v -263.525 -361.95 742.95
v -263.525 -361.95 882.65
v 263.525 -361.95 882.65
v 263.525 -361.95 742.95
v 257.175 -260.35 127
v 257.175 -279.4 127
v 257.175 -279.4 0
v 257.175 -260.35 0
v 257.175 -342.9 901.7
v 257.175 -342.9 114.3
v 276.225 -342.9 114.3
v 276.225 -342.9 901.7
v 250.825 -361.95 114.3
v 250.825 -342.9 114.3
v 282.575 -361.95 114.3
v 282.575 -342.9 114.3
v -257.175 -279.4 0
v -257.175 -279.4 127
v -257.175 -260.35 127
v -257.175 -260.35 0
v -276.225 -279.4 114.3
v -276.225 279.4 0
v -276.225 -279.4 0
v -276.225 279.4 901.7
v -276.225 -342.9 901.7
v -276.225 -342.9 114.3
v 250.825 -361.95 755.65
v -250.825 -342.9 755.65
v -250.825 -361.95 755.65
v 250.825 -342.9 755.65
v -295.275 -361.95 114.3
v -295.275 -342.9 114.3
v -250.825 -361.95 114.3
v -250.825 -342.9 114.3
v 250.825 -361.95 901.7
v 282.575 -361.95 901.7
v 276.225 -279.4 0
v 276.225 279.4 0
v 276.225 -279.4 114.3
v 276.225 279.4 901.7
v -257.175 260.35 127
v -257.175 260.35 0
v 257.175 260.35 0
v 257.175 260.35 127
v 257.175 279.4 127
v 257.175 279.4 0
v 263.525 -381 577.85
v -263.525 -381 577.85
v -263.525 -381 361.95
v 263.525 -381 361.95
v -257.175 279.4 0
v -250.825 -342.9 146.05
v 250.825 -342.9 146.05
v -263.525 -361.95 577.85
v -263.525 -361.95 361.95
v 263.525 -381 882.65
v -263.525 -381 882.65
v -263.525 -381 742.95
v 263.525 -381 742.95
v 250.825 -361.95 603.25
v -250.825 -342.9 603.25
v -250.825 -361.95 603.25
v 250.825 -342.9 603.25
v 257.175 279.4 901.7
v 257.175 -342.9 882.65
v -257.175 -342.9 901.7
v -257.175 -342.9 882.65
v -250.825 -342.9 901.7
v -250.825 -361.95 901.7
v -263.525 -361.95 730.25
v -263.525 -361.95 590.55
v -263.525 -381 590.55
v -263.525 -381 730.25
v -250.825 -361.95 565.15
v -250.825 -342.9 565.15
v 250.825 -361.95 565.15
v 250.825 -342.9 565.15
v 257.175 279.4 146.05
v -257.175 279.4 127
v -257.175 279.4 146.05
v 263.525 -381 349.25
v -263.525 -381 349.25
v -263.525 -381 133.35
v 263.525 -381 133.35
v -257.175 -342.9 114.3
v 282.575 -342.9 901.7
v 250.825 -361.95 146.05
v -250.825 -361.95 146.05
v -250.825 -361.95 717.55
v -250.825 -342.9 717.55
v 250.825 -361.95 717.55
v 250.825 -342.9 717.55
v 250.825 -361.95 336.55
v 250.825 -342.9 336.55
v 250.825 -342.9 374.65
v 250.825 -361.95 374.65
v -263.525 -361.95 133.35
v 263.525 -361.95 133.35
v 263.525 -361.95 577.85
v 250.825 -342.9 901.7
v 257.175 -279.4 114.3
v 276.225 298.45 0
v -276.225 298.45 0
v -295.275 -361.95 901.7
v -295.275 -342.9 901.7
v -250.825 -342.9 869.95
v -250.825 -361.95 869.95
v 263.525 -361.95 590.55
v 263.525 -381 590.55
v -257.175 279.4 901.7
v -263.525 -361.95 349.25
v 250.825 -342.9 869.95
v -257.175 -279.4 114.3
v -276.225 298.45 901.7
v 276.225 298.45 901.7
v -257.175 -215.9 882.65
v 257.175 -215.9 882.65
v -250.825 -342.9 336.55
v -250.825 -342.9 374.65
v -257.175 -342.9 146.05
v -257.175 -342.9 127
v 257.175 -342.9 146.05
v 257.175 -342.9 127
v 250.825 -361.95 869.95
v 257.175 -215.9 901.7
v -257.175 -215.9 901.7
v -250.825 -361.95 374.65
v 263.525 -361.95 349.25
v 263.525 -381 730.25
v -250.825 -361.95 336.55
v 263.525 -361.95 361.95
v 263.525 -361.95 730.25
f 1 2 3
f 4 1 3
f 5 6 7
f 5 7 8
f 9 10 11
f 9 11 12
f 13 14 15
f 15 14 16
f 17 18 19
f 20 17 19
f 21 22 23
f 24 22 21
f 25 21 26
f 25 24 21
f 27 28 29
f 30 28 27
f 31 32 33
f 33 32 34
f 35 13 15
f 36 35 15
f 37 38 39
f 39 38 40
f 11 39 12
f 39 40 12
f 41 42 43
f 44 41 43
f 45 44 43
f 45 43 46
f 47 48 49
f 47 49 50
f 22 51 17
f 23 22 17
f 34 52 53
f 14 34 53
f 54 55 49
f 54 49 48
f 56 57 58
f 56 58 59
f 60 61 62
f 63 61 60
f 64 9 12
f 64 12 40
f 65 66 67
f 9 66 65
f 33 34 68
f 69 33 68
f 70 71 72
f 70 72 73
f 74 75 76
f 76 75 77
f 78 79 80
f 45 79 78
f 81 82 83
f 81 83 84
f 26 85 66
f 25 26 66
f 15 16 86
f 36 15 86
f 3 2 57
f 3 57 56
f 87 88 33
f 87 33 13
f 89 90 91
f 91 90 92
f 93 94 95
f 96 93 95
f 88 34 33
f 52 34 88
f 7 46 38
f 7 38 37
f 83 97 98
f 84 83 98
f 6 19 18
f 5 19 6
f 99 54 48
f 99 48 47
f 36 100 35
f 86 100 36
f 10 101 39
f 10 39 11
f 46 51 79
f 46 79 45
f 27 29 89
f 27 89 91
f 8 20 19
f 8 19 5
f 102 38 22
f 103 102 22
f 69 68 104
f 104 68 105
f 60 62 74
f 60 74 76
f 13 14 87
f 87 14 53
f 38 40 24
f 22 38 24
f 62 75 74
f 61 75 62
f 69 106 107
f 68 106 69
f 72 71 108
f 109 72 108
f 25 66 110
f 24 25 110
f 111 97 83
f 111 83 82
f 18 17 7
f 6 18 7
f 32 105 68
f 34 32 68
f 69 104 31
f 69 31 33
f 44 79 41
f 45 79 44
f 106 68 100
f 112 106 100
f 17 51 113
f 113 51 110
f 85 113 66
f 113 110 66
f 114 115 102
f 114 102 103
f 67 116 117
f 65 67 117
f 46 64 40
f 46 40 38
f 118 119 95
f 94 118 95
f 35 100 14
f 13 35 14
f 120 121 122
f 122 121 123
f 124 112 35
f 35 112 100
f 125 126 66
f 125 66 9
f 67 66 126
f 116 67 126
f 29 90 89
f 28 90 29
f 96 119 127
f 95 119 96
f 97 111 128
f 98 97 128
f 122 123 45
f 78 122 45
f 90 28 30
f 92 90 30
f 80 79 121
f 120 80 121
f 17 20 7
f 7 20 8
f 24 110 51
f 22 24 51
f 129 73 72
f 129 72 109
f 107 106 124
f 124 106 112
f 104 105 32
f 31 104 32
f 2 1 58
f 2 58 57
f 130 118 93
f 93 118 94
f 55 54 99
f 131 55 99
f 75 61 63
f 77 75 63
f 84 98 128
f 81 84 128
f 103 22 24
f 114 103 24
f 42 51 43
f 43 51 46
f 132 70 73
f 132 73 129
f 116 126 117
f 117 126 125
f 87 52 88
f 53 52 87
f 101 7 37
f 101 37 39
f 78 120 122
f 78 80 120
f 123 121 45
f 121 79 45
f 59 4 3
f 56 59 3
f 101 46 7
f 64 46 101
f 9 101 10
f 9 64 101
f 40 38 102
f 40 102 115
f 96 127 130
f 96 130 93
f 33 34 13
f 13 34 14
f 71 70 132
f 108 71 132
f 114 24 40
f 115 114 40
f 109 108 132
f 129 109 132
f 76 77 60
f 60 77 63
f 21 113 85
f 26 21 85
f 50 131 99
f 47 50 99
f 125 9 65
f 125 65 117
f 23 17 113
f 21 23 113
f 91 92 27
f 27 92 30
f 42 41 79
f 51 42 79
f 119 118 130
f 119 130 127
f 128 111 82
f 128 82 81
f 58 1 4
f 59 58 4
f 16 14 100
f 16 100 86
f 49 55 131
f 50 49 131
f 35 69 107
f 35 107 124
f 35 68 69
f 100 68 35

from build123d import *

# Parameters (mm, degrees)
F0_W      = 514.35
F0_H      = 19.05
F1_DEPTH  = 127
F2_W      = 19.05
F2_H      = 127
F3_DEPTH  = 19.05
F5_W      = 514.35
F5_H      = 603.25
F5_H_2    = 19.05
F6_DEPTH  = 19.05
F7_W      = 514.35
F7_H      = 127
F8_DEPTH  = 19.05
F9_W      = 501.65
F9_H      = 31.75
F10_DEPTH = 19.05
F11_DEPTH = 19.05
F9_W_2    = 19.05
F9_W_3    = 6.35
F9_H_2    = 723.9
F12_DEPTH = 19.05
F9_W_4    = 31.75
F13_DEPTH = 19.05
F9_H_3    = 38.1
F14_DEPTH = 19.05
F15_W     = 533.4
F15_H     = 901.7
F15_W_2   = 19.05
F16_DEPTH = 19.05
F17_W     = 527.05
F17_H     = 139.7
F18_DEPTH = 19.05
F17_H_2   = 215.9


with BuildPart() as f1:
    # F0 (on Top) → F1 (new body)
    with BuildSketch(Plane.XY):
        with Locations((0, 269.875)):
            Rectangle(F0_W, F0_H)
    extrude(amount=F1_DEPTH)


with BuildPart() as f1b:
    # F0 (on Top) → F1, piece 2 (new body)
    with BuildSketch(Plane.XY):
        with Locations((0, -269.875)):
            Rectangle(F0_W, F0_H)
    extrude(amount=F1_DEPTH)


with BuildPart() as f3:
    # F2 (on face) → F3 (new body)
    with BuildSketch(Plane(origin=(-257.175, 0, 0), x_dir=(0, -1, 0), z_dir=(-1, 0, 0))):
        Polygon((-260.35, 127), (-260.35, 0), (279.4, 0), (279.4, 114.3), (342.9, 114.3), (342.9, 901.7), (-279.4, 901.7), (-279.4, 127), align=None)
        with Locations((-269.875, 63.5)):
            Rectangle(F2_W, F2_H)
    extrude(amount=F3_DEPTH)


with BuildPart() as f4_1:
    # F4: instance of F3
    add(f3.part.mirror(Plane.YZ))


with BuildPart() as f6:
    # F5 (on face) → F6 (new body)
    with BuildSketch(Plane.XY.offset(127)):
        with Locations((0, -41.275)):
            Rectangle(F5_W, F5_H)
        with Locations((0, 269.875)):
            Rectangle(F5_W, F5_H_2)
    extrude(amount=F6_DEPTH)


with BuildPart() as f8:
    # F7 (on face) → F8 (new body)
    with BuildSketch(Plane.XY.offset(901.7)):
        with Locations((0, -279.4)):
            Rectangle(F7_W, F7_H)
    extrude(amount=-F8_DEPTH)


with BuildPart() as f10:
    # F9 (on face) → F10 (new body)
    with BuildSketch(Plane.XZ.offset(342.9)):
        with Locations((0, 885.825)):
            Rectangle(F9_W, F9_H)
    extrude(amount=F10_DEPTH)


with BuildPart() as f11:
    # F9 (on face) → F11 (new body)
    with BuildSketch(Plane.XZ.offset(342.9)):
        with Locations((0, 130.175)):
            Rectangle(F9_W, F9_H)
    extrude(amount=F11_DEPTH)


with BuildPart() as f11b:
    # F9 (on face) → F11, piece 2 (new body)
    with BuildSketch(Plane.XZ.offset(342.9)):
        with Locations((-266.7, 130.175)):
            Rectangle(F9_W_2, F9_H)
        with Locations((-279.4, 130.175)):
            Rectangle(F9_W_3, F9_H)
    extrude(amount=F11_DEPTH)

    # F9 (on face) → F12 (join)
    with BuildSketch(Plane.XZ.offset(342.9)):
        Polygon((-250.825, 869.95), (-257.175, 869.95), (-257.175, 146.05), (-250.825, 146.05), (-250.825, 336.55), (-250.825, 374.65), (-250.825, 565.15), (-250.825, 603.25), (-250.825, 717.55), (-250.825, 755.65), align=None)
        with Locations((-266.7, 508)):
            Rectangle(F9_W_2, F9_H_2)
        with Locations((-279.4, 508)):
            Rectangle(F9_W_3, F9_H_2)
        with Locations((-266.7, 885.825)):
            Rectangle(F9_W_2, F9_H)
        with Locations((-254, 885.825)):
            Rectangle(F9_W_3, F9_H)
        with Locations((-279.4, 885.825)):
            Rectangle(F9_W_3, F9_H)
        with Locations((-254, 130.175)):
            Rectangle(F9_W_3, F9_H)
        with Locations((-266.7, 130.175)):
            Rectangle(F9_W_2, F9_H)
        with Locations((-279.4, 130.175)):
            Rectangle(F9_W_3, F9_H)
        Polygon((-282.575, 869.95), (-282.575, 901.7), (-295.275, 901.7), (-295.275, 114.3), (-282.575, 114.3), (-282.575, 146.05), align=None)
    extrude(amount=F12_DEPTH)


with BuildPart() as f13:
    # F9 (on face) → F13 (new body)
    with BuildSketch(Plane.XZ.offset(342.9)):
        Polygon((282.575, 869.95), (250.825, 869.95), (250.825, 755.65), (250.825, 717.55), (250.825, 603.25), (250.825, 565.15), (250.825, 374.65), (250.825, 336.55), (250.825, 146.05), (282.575, 146.05), align=None)
        with Locations((266.7, 130.175)):
            Rectangle(F9_W_4, F9_H)
        with Locations((266.7, 885.825)):
            Rectangle(F9_W_4, F9_H)
    extrude(amount=F13_DEPTH)


with BuildPart() as f14:
    # F9 (on face) → F14 (new body)
    with BuildSketch(Plane.XZ.offset(342.9)):
        with Locations((0, 736.6)):
            Rectangle(F9_W, F9_H_3)
    extrude(amount=F14_DEPTH)


with BuildPart() as f14b:
    # F9 (on face) → F14, piece 2 (new body)
    with BuildSketch(Plane.XZ.offset(342.9)):
        with Locations((0, 355.6)):
            Rectangle(F9_W, F9_H_3)
    extrude(amount=F14_DEPTH)


with BuildPart() as f14c:
    # F9 (on face) → F14, piece 3 (new body)
    with BuildSketch(Plane.XZ.offset(342.9)):
        with Locations((0, 584.2)):
            Rectangle(F9_W, F9_H_3)
    extrude(amount=F14_DEPTH)


with BuildPart() as f16:
    # F15 (on face) → F16 (new body)
    with BuildSketch(Plane(origin=(0, 279.4, 0), x_dir=(-1, 0, 0), z_dir=(0, 1, 0))):
        with Locations((9.525, 450.85)):
            Rectangle(F15_W, F15_H)
        with Locations((-266.7, 450.85)):
            Rectangle(F15_W_2, F15_H)
    extrude(amount=F16_DEPTH)


with BuildPart() as f18:
    # F17 (on face) → F18 (new body)
    with BuildSketch(Plane.XZ.offset(361.95)):
        with Locations((0, 812.8)):
            Rectangle(F17_W, F17_H)
    extrude(amount=F18_DEPTH)


with BuildPart() as f18b:
    # F17 (on face) → F18, piece 2 (new body)
    with BuildSketch(Plane.XZ.offset(361.95)):
        with Locations((0, 660.4)):
            Rectangle(F17_W, F17_H)
    extrude(amount=F18_DEPTH)


with BuildPart() as f18c:
    # F17 (on face) → F18, piece 3 (new body)
    with BuildSketch(Plane.XZ.offset(361.95)):
        with Locations((0, 469.9)):
            Rectangle(F17_W, F17_H_2)
    extrude(amount=F18_DEPTH)


with BuildPart() as f18d:
    # F17 (on face) → F18, piece 4 (new body)
    with BuildSketch(Plane.XZ.offset(361.95)):
        with Locations((0, 241.3)):
            Rectangle(F17_W, F17_H_2)
    extrude(amount=F18_DEPTH)


solid = Compound([f1.part, f1b.part, f3.part, f4_1.part, f6.part, f8.part, f10.part, f11.part, f11b.part, f13.part, f14.part, f14b.part, f14c.part, f16.part, f18.part, f18b.part, f18c.part, f18d.part])
